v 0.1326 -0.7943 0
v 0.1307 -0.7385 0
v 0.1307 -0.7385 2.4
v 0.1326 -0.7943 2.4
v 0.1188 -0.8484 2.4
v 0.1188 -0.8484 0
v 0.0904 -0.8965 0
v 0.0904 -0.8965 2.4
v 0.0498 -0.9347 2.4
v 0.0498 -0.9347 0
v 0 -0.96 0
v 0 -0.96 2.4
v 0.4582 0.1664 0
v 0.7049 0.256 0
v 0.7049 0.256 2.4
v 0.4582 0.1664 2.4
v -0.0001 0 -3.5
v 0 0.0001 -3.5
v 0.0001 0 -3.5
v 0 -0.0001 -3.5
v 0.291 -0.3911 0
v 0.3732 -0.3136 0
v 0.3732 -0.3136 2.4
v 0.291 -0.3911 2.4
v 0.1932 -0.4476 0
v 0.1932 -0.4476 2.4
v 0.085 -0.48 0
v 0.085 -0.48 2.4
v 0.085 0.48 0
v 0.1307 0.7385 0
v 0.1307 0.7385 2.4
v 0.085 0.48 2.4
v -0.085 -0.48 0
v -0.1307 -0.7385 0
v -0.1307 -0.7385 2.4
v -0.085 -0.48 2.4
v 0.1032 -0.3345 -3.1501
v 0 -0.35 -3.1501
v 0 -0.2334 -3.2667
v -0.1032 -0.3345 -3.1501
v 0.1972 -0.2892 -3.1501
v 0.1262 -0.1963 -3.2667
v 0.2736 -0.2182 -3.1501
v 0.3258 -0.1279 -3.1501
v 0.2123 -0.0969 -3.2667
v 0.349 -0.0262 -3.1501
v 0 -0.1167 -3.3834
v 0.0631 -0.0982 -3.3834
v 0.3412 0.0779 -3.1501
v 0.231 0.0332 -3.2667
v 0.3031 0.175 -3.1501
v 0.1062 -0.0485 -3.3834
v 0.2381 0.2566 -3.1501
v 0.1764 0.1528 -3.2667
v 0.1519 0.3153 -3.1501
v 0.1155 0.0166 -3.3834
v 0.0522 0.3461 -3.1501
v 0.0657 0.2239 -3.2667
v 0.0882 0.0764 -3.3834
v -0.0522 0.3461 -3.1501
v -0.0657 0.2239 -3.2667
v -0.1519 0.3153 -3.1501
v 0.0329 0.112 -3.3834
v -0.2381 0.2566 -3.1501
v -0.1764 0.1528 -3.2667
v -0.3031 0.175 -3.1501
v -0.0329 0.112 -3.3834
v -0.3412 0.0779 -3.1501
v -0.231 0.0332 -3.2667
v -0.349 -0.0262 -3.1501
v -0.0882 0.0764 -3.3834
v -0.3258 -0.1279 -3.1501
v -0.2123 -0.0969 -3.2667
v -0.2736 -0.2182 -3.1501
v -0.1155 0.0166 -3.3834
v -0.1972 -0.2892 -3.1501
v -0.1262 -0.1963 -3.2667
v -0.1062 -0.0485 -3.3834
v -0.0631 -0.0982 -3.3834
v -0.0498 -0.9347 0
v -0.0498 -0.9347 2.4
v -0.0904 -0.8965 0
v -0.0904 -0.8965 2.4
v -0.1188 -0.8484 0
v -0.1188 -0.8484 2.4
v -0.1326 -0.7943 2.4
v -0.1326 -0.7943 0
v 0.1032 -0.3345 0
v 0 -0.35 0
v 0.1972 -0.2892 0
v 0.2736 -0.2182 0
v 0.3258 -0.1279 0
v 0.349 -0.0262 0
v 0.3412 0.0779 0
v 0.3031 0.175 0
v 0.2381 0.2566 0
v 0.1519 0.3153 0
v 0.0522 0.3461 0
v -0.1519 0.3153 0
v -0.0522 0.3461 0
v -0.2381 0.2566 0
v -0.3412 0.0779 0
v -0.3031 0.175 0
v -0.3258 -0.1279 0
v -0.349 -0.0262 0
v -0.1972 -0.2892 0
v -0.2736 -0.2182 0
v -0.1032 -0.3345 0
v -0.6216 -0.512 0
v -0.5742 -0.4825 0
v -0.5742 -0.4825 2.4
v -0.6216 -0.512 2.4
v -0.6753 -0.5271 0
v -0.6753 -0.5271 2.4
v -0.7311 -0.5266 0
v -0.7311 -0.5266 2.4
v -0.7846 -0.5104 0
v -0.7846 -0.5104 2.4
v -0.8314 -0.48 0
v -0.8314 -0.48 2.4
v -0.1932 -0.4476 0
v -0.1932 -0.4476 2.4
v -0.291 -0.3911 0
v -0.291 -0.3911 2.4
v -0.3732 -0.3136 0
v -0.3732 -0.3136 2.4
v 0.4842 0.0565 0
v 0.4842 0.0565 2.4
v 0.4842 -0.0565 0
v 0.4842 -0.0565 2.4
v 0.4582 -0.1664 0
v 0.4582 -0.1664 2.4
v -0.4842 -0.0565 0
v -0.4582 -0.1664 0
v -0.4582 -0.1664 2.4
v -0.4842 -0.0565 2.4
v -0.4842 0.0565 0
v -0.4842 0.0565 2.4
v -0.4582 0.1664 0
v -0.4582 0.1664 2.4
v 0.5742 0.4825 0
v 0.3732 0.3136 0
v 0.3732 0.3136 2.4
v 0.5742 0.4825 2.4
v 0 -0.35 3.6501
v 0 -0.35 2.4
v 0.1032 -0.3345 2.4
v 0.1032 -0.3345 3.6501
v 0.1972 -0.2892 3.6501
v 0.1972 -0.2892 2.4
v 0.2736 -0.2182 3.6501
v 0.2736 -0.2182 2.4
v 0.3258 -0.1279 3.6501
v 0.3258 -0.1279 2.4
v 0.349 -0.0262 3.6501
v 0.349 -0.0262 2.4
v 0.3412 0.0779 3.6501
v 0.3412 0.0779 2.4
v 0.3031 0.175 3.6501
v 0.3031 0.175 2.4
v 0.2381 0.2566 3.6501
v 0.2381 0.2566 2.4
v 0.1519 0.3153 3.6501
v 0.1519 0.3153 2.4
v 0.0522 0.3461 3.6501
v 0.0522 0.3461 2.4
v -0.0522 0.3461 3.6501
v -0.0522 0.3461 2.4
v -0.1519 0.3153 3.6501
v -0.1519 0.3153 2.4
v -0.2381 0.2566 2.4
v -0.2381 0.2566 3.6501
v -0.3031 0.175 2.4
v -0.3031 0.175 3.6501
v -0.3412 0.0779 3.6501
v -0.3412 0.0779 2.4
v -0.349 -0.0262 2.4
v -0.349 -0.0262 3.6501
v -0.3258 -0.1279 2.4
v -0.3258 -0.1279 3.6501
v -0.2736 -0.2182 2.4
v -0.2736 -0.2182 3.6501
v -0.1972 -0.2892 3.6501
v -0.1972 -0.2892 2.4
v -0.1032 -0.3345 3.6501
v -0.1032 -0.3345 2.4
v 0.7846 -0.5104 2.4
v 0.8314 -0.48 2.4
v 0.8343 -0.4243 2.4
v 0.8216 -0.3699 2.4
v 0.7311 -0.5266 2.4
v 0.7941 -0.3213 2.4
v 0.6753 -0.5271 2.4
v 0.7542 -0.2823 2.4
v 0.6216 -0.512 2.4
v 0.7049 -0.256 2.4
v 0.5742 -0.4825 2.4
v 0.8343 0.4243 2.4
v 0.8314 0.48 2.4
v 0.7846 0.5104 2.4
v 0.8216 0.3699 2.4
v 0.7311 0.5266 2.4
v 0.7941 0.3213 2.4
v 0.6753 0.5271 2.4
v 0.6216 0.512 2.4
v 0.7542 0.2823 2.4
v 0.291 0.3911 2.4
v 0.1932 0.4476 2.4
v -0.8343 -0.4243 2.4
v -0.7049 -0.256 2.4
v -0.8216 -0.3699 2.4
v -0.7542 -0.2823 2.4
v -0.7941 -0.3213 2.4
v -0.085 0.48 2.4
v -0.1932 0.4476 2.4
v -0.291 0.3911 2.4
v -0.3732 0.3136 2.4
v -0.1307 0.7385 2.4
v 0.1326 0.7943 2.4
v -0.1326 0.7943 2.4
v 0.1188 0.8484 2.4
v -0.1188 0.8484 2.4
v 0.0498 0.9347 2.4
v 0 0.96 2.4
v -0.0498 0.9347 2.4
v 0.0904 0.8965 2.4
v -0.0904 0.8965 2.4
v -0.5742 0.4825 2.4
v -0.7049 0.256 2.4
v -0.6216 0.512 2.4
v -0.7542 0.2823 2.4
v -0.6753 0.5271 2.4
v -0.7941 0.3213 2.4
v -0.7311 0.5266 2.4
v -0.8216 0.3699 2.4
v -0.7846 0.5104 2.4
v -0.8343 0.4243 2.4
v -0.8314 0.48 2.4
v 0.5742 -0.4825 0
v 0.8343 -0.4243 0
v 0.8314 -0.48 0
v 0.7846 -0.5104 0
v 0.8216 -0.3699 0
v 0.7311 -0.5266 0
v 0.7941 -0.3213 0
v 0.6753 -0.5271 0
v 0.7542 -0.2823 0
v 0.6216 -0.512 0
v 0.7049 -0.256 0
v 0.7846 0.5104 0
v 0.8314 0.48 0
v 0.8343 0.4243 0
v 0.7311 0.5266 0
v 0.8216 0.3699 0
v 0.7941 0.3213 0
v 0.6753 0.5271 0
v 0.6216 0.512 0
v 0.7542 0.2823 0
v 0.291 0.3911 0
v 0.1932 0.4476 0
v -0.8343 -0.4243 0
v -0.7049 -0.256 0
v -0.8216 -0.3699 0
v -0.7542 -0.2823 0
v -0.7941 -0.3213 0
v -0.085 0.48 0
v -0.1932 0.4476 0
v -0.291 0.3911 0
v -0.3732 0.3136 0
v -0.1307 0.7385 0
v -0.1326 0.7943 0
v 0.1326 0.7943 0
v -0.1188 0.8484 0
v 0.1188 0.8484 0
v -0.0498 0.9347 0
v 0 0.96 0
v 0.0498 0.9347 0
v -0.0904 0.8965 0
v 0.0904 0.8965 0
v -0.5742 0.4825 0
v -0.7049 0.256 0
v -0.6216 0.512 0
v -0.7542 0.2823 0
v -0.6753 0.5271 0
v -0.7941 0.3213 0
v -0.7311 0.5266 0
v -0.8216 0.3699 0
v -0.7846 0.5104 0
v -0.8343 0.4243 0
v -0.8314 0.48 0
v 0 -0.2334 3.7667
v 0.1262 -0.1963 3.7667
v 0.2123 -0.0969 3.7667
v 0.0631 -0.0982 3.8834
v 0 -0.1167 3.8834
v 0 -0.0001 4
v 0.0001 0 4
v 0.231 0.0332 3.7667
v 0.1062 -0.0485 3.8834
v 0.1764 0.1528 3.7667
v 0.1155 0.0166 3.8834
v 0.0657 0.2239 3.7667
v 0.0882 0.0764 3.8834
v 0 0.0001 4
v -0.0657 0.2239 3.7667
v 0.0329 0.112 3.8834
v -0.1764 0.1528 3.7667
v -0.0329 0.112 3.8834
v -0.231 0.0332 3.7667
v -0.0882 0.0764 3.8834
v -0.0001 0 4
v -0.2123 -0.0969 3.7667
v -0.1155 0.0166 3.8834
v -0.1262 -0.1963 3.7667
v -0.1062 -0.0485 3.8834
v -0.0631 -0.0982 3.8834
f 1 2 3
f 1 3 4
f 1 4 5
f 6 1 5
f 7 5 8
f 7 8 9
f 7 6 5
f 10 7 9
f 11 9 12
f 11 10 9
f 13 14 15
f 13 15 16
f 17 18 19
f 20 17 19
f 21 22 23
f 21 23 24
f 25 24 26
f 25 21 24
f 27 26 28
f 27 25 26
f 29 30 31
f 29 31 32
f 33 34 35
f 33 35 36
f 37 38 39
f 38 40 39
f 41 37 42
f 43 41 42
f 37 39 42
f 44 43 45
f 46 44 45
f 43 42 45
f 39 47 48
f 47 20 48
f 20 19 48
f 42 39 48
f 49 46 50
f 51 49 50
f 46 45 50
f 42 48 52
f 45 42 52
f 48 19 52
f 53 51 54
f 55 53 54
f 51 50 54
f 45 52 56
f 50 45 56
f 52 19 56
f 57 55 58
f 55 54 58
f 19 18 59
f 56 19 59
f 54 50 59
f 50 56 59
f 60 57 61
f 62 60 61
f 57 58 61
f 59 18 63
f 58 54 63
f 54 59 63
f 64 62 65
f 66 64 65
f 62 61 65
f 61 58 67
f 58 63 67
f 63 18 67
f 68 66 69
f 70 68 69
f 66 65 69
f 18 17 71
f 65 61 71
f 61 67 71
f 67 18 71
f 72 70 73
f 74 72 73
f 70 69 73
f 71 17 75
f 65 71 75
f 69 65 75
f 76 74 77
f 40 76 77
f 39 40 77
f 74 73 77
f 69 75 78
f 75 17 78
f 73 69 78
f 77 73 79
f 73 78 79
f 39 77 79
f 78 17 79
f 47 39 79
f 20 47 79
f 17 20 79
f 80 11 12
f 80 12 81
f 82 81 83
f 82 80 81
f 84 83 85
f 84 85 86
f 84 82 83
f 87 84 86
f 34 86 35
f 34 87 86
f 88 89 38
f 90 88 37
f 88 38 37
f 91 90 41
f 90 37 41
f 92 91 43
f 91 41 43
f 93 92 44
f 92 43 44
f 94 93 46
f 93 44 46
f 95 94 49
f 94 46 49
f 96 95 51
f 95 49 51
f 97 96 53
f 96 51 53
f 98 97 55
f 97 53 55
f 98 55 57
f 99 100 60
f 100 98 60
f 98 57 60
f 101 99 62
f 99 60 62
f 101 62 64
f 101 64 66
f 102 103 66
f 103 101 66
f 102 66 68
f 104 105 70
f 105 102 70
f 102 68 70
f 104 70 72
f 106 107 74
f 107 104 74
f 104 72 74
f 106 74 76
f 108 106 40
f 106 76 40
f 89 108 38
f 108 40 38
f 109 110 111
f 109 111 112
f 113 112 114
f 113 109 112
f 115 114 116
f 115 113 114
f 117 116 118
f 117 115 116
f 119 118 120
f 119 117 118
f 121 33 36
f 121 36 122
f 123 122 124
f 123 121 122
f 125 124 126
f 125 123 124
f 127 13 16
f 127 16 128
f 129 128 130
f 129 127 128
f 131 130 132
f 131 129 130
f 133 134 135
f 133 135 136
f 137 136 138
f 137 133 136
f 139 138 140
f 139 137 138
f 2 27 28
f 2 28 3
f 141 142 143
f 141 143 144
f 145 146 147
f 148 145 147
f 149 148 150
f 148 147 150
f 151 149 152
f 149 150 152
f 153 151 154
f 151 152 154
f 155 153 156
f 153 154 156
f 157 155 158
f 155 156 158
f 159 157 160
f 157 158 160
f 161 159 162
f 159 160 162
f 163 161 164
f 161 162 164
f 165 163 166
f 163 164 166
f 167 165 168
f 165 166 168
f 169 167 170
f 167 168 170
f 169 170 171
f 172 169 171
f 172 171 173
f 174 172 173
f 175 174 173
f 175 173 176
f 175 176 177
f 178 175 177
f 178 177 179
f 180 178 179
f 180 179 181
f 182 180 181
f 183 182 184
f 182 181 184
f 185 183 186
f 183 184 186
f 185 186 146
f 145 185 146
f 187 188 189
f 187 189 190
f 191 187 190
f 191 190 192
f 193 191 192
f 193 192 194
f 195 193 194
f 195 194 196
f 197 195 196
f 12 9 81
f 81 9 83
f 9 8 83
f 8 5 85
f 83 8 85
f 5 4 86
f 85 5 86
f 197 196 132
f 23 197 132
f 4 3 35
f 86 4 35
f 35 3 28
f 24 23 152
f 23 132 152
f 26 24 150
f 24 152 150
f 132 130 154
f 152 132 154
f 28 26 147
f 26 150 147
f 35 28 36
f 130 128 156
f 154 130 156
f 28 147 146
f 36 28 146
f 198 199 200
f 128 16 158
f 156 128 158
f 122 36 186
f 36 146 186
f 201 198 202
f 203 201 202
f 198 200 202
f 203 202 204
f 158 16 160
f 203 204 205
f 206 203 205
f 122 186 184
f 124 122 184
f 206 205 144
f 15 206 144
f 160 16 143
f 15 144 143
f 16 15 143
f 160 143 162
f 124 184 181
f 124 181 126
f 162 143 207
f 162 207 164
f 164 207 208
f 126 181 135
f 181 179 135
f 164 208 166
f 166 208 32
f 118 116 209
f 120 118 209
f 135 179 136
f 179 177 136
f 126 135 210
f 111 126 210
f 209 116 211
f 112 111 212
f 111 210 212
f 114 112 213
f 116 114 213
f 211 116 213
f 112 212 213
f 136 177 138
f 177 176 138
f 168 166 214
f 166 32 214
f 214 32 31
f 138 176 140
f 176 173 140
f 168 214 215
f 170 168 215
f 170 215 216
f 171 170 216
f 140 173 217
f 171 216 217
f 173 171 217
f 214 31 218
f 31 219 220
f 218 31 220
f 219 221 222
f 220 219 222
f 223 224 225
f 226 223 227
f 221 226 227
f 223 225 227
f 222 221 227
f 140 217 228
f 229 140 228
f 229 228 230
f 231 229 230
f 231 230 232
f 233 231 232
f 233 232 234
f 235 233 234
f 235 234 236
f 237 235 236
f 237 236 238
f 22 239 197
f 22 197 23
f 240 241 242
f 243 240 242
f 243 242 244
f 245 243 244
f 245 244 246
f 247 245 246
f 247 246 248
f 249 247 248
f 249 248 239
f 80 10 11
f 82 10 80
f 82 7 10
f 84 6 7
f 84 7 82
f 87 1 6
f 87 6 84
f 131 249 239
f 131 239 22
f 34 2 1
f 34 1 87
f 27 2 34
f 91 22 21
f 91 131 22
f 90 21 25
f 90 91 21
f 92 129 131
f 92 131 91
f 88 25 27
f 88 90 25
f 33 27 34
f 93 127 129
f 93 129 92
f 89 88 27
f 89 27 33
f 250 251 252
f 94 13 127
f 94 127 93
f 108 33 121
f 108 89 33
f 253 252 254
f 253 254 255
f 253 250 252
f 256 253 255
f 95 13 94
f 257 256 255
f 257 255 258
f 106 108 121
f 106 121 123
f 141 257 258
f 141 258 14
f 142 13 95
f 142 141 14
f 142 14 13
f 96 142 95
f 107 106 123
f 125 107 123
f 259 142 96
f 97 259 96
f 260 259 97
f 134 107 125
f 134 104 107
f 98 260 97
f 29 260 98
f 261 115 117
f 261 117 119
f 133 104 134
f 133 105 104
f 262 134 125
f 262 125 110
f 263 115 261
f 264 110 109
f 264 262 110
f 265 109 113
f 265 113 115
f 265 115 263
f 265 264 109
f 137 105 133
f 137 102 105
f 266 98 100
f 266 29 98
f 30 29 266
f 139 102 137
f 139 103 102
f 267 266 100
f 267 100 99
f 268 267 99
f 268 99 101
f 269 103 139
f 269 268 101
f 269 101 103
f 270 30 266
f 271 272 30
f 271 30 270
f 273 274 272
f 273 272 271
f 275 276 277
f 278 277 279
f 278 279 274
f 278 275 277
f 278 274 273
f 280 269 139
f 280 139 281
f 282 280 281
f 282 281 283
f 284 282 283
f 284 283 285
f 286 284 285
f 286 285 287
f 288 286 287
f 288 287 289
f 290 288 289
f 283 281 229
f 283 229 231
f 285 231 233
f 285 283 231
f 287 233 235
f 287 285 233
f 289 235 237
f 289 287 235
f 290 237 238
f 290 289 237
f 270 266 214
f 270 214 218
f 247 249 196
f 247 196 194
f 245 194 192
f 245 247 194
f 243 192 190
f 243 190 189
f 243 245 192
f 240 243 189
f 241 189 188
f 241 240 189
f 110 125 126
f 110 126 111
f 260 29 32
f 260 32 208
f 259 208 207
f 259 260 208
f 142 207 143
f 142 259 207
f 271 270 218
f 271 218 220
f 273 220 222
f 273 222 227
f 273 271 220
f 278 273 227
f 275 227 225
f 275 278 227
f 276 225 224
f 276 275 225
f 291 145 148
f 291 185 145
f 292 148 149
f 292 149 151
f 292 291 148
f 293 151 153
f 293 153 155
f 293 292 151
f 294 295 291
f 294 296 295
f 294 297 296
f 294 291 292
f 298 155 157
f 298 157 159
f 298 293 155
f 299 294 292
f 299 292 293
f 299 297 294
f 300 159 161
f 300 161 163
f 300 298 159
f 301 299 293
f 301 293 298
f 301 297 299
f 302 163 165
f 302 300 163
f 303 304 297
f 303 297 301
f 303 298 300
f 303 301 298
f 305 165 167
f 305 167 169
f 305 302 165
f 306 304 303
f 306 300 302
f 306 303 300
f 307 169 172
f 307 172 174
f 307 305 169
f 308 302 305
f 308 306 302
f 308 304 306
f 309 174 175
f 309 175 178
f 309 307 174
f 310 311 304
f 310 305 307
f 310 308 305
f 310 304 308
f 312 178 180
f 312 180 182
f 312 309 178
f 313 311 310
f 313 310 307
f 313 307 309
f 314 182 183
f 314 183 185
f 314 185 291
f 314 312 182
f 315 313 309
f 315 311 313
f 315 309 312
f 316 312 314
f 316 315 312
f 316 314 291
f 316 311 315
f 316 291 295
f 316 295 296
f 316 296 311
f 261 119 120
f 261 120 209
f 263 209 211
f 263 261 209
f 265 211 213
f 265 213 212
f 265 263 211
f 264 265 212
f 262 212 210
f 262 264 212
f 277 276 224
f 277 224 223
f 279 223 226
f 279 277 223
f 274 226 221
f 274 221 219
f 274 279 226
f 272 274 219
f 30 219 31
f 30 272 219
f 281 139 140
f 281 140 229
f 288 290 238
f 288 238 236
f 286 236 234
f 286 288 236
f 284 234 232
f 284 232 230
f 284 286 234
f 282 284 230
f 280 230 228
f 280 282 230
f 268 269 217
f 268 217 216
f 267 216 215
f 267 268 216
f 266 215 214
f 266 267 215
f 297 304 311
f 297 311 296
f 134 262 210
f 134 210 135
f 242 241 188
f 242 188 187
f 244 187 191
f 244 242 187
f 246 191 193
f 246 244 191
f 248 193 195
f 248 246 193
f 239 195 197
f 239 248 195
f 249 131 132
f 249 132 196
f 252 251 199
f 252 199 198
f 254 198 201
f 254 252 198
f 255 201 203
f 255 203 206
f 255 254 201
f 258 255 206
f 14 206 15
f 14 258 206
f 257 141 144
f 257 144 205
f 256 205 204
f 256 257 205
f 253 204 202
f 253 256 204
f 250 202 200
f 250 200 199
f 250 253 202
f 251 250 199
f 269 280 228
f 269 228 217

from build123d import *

# Parameters (mm, degrees)
SKETCH2_R                = 0.35
BOSS_EXTRUDE2_DEPTH      = 2.4
BOSS_EXTRUDE3_DEPTH      = 4
BOSS_EXTRUDE3_DEPTH_BACK = 3.5
SKETCH2_2_R              = 0.35
CHAMFER1_SIZE            = 0.35


with BuildPart() as part:
    # Sketch2 → Boss-Extrude2 (new body)
    with BuildSketch(Plane.XY):
        with BuildLine():
            Line((-0.084985286, 0.480035156), (-0.130746593, 0.738515625))
            ThreePointArc((-0.130746593, 0.738515625), (-0.106331255, 0.873436103), (0, 0.96))
            ThreePointArc((0, 0.96), (0.106331255, 0.873436103), (0.130746593, 0.738515625))
            Line((0.130746593, 0.738515625), (0.084985286, 0.480035156))
            ThreePointArc((0.084985286, 0.480035156), (0.24375, 0.422187384), (0.373229997, 0.313616994))
            Line((0.373229997, 0.313616994), (0.574199996, 0.482487684))
            ThreePointArc((0.574199996, 0.482487684), (0.703252226, 0.528803619), (0.831384388, 0.48))
            ThreePointArc((0.831384388, 0.48), (0.809583481, 0.344632483), (0.704946589, 0.256027941))
            Line((0.704946589, 0.256027941), (0.458215283, 0.166418162))
            ThreePointArc((0.458215283, 0.166418162), (0.4875, 0), (0.458215283, -0.166418162))
            Line((0.458215283, -0.166418162), (0.704946589, -0.256027941))
            ThreePointArc((0.704946589, -0.256027941), (0.809583481, -0.344632483), (0.831384388, -0.48))
            ThreePointArc((0.831384388, -0.48), (0.703252226, -0.528803619), (0.574199996, -0.482487684))
            Line((0.574199996, -0.482487684), (0.373229997, -0.313616994))
            ThreePointArc((0.373229997, -0.313616994), (0.24375, -0.422187384), (0.084985286, -0.480035156))
            Line((0.084985286, -0.480035156), (0.130746593, -0.738515625))
            ThreePointArc((0.130746593, -0.738515625), (0.106331255, -0.873436103), (0, -0.96))
            ThreePointArc((0, -0.96), (-0.106331255, -0.873436103), (-0.130746593, -0.738515625))
            Line((-0.130746593, -0.738515625), (-0.084985286, -0.480035156))
            ThreePointArc((-0.084985286, -0.480035156), (-0.24375, -0.422187384), (-0.373229997, -0.313616994))
            Line((-0.373229997, -0.313616994), (-0.574199996, -0.482487684))
            ThreePointArc((-0.574199996, -0.482487684), (-0.703252226, -0.528803619), (-0.831384388, -0.48))
            ThreePointArc((-0.831384388, -0.48), (-0.809583481, -0.344632483), (-0.704946589, -0.256027941))
            Line((-0.704946589, -0.256027941), (-0.458215283, -0.166418162))
            ThreePointArc((-0.458215283, -0.166418162), (-0.4875, 0), (-0.458215283, 0.166418162))
            Line((-0.458215283, 0.166418162), (-0.704946589, 0.256027941))
            ThreePointArc((-0.704946589, 0.256027941), (-0.809583481, 0.344632483), (-0.831384388, 0.48))
            ThreePointArc((-0.831384388, 0.48), (-0.703252226, 0.528803619), (-0.574199996, 0.482487684))
            Line((-0.574199996, 0.482487684), (-0.373229997, 0.313616994))
            ThreePointArc((-0.373229997, 0.313616994), (-0.24375, 0.422187384), (-0.084985286, 0.480035156))
        make_face()
        Circle(SKETCH2_R, mode=Mode.SUBTRACT)
    extrude(amount=BOSS_EXTRUDE2_DEPTH)

    # Sketch2<2> → Boss-Extrude3 (add, two sides: drawn at the far end of the back side and taken through both)
    with BuildSketch(Plane.XY.offset(-BOSS_EXTRUDE3_DEPTH_BACK)):
        Circle(SKETCH2_2_R)
    extrude(amount=BOSS_EXTRUDE3_DEPTH + BOSS_EXTRUDE3_DEPTH_BACK)

    # Chamfer1
    chamfer1_edges = [part.edges().sort_by_distance(p)[0] for p in [
        (-0.35, 0, -3.5),
        (-0.35, 0, 4),
    ]]
    chamfer(chamfer1_edges, length=CHAMFER1_SIZE)


solid = part.part
